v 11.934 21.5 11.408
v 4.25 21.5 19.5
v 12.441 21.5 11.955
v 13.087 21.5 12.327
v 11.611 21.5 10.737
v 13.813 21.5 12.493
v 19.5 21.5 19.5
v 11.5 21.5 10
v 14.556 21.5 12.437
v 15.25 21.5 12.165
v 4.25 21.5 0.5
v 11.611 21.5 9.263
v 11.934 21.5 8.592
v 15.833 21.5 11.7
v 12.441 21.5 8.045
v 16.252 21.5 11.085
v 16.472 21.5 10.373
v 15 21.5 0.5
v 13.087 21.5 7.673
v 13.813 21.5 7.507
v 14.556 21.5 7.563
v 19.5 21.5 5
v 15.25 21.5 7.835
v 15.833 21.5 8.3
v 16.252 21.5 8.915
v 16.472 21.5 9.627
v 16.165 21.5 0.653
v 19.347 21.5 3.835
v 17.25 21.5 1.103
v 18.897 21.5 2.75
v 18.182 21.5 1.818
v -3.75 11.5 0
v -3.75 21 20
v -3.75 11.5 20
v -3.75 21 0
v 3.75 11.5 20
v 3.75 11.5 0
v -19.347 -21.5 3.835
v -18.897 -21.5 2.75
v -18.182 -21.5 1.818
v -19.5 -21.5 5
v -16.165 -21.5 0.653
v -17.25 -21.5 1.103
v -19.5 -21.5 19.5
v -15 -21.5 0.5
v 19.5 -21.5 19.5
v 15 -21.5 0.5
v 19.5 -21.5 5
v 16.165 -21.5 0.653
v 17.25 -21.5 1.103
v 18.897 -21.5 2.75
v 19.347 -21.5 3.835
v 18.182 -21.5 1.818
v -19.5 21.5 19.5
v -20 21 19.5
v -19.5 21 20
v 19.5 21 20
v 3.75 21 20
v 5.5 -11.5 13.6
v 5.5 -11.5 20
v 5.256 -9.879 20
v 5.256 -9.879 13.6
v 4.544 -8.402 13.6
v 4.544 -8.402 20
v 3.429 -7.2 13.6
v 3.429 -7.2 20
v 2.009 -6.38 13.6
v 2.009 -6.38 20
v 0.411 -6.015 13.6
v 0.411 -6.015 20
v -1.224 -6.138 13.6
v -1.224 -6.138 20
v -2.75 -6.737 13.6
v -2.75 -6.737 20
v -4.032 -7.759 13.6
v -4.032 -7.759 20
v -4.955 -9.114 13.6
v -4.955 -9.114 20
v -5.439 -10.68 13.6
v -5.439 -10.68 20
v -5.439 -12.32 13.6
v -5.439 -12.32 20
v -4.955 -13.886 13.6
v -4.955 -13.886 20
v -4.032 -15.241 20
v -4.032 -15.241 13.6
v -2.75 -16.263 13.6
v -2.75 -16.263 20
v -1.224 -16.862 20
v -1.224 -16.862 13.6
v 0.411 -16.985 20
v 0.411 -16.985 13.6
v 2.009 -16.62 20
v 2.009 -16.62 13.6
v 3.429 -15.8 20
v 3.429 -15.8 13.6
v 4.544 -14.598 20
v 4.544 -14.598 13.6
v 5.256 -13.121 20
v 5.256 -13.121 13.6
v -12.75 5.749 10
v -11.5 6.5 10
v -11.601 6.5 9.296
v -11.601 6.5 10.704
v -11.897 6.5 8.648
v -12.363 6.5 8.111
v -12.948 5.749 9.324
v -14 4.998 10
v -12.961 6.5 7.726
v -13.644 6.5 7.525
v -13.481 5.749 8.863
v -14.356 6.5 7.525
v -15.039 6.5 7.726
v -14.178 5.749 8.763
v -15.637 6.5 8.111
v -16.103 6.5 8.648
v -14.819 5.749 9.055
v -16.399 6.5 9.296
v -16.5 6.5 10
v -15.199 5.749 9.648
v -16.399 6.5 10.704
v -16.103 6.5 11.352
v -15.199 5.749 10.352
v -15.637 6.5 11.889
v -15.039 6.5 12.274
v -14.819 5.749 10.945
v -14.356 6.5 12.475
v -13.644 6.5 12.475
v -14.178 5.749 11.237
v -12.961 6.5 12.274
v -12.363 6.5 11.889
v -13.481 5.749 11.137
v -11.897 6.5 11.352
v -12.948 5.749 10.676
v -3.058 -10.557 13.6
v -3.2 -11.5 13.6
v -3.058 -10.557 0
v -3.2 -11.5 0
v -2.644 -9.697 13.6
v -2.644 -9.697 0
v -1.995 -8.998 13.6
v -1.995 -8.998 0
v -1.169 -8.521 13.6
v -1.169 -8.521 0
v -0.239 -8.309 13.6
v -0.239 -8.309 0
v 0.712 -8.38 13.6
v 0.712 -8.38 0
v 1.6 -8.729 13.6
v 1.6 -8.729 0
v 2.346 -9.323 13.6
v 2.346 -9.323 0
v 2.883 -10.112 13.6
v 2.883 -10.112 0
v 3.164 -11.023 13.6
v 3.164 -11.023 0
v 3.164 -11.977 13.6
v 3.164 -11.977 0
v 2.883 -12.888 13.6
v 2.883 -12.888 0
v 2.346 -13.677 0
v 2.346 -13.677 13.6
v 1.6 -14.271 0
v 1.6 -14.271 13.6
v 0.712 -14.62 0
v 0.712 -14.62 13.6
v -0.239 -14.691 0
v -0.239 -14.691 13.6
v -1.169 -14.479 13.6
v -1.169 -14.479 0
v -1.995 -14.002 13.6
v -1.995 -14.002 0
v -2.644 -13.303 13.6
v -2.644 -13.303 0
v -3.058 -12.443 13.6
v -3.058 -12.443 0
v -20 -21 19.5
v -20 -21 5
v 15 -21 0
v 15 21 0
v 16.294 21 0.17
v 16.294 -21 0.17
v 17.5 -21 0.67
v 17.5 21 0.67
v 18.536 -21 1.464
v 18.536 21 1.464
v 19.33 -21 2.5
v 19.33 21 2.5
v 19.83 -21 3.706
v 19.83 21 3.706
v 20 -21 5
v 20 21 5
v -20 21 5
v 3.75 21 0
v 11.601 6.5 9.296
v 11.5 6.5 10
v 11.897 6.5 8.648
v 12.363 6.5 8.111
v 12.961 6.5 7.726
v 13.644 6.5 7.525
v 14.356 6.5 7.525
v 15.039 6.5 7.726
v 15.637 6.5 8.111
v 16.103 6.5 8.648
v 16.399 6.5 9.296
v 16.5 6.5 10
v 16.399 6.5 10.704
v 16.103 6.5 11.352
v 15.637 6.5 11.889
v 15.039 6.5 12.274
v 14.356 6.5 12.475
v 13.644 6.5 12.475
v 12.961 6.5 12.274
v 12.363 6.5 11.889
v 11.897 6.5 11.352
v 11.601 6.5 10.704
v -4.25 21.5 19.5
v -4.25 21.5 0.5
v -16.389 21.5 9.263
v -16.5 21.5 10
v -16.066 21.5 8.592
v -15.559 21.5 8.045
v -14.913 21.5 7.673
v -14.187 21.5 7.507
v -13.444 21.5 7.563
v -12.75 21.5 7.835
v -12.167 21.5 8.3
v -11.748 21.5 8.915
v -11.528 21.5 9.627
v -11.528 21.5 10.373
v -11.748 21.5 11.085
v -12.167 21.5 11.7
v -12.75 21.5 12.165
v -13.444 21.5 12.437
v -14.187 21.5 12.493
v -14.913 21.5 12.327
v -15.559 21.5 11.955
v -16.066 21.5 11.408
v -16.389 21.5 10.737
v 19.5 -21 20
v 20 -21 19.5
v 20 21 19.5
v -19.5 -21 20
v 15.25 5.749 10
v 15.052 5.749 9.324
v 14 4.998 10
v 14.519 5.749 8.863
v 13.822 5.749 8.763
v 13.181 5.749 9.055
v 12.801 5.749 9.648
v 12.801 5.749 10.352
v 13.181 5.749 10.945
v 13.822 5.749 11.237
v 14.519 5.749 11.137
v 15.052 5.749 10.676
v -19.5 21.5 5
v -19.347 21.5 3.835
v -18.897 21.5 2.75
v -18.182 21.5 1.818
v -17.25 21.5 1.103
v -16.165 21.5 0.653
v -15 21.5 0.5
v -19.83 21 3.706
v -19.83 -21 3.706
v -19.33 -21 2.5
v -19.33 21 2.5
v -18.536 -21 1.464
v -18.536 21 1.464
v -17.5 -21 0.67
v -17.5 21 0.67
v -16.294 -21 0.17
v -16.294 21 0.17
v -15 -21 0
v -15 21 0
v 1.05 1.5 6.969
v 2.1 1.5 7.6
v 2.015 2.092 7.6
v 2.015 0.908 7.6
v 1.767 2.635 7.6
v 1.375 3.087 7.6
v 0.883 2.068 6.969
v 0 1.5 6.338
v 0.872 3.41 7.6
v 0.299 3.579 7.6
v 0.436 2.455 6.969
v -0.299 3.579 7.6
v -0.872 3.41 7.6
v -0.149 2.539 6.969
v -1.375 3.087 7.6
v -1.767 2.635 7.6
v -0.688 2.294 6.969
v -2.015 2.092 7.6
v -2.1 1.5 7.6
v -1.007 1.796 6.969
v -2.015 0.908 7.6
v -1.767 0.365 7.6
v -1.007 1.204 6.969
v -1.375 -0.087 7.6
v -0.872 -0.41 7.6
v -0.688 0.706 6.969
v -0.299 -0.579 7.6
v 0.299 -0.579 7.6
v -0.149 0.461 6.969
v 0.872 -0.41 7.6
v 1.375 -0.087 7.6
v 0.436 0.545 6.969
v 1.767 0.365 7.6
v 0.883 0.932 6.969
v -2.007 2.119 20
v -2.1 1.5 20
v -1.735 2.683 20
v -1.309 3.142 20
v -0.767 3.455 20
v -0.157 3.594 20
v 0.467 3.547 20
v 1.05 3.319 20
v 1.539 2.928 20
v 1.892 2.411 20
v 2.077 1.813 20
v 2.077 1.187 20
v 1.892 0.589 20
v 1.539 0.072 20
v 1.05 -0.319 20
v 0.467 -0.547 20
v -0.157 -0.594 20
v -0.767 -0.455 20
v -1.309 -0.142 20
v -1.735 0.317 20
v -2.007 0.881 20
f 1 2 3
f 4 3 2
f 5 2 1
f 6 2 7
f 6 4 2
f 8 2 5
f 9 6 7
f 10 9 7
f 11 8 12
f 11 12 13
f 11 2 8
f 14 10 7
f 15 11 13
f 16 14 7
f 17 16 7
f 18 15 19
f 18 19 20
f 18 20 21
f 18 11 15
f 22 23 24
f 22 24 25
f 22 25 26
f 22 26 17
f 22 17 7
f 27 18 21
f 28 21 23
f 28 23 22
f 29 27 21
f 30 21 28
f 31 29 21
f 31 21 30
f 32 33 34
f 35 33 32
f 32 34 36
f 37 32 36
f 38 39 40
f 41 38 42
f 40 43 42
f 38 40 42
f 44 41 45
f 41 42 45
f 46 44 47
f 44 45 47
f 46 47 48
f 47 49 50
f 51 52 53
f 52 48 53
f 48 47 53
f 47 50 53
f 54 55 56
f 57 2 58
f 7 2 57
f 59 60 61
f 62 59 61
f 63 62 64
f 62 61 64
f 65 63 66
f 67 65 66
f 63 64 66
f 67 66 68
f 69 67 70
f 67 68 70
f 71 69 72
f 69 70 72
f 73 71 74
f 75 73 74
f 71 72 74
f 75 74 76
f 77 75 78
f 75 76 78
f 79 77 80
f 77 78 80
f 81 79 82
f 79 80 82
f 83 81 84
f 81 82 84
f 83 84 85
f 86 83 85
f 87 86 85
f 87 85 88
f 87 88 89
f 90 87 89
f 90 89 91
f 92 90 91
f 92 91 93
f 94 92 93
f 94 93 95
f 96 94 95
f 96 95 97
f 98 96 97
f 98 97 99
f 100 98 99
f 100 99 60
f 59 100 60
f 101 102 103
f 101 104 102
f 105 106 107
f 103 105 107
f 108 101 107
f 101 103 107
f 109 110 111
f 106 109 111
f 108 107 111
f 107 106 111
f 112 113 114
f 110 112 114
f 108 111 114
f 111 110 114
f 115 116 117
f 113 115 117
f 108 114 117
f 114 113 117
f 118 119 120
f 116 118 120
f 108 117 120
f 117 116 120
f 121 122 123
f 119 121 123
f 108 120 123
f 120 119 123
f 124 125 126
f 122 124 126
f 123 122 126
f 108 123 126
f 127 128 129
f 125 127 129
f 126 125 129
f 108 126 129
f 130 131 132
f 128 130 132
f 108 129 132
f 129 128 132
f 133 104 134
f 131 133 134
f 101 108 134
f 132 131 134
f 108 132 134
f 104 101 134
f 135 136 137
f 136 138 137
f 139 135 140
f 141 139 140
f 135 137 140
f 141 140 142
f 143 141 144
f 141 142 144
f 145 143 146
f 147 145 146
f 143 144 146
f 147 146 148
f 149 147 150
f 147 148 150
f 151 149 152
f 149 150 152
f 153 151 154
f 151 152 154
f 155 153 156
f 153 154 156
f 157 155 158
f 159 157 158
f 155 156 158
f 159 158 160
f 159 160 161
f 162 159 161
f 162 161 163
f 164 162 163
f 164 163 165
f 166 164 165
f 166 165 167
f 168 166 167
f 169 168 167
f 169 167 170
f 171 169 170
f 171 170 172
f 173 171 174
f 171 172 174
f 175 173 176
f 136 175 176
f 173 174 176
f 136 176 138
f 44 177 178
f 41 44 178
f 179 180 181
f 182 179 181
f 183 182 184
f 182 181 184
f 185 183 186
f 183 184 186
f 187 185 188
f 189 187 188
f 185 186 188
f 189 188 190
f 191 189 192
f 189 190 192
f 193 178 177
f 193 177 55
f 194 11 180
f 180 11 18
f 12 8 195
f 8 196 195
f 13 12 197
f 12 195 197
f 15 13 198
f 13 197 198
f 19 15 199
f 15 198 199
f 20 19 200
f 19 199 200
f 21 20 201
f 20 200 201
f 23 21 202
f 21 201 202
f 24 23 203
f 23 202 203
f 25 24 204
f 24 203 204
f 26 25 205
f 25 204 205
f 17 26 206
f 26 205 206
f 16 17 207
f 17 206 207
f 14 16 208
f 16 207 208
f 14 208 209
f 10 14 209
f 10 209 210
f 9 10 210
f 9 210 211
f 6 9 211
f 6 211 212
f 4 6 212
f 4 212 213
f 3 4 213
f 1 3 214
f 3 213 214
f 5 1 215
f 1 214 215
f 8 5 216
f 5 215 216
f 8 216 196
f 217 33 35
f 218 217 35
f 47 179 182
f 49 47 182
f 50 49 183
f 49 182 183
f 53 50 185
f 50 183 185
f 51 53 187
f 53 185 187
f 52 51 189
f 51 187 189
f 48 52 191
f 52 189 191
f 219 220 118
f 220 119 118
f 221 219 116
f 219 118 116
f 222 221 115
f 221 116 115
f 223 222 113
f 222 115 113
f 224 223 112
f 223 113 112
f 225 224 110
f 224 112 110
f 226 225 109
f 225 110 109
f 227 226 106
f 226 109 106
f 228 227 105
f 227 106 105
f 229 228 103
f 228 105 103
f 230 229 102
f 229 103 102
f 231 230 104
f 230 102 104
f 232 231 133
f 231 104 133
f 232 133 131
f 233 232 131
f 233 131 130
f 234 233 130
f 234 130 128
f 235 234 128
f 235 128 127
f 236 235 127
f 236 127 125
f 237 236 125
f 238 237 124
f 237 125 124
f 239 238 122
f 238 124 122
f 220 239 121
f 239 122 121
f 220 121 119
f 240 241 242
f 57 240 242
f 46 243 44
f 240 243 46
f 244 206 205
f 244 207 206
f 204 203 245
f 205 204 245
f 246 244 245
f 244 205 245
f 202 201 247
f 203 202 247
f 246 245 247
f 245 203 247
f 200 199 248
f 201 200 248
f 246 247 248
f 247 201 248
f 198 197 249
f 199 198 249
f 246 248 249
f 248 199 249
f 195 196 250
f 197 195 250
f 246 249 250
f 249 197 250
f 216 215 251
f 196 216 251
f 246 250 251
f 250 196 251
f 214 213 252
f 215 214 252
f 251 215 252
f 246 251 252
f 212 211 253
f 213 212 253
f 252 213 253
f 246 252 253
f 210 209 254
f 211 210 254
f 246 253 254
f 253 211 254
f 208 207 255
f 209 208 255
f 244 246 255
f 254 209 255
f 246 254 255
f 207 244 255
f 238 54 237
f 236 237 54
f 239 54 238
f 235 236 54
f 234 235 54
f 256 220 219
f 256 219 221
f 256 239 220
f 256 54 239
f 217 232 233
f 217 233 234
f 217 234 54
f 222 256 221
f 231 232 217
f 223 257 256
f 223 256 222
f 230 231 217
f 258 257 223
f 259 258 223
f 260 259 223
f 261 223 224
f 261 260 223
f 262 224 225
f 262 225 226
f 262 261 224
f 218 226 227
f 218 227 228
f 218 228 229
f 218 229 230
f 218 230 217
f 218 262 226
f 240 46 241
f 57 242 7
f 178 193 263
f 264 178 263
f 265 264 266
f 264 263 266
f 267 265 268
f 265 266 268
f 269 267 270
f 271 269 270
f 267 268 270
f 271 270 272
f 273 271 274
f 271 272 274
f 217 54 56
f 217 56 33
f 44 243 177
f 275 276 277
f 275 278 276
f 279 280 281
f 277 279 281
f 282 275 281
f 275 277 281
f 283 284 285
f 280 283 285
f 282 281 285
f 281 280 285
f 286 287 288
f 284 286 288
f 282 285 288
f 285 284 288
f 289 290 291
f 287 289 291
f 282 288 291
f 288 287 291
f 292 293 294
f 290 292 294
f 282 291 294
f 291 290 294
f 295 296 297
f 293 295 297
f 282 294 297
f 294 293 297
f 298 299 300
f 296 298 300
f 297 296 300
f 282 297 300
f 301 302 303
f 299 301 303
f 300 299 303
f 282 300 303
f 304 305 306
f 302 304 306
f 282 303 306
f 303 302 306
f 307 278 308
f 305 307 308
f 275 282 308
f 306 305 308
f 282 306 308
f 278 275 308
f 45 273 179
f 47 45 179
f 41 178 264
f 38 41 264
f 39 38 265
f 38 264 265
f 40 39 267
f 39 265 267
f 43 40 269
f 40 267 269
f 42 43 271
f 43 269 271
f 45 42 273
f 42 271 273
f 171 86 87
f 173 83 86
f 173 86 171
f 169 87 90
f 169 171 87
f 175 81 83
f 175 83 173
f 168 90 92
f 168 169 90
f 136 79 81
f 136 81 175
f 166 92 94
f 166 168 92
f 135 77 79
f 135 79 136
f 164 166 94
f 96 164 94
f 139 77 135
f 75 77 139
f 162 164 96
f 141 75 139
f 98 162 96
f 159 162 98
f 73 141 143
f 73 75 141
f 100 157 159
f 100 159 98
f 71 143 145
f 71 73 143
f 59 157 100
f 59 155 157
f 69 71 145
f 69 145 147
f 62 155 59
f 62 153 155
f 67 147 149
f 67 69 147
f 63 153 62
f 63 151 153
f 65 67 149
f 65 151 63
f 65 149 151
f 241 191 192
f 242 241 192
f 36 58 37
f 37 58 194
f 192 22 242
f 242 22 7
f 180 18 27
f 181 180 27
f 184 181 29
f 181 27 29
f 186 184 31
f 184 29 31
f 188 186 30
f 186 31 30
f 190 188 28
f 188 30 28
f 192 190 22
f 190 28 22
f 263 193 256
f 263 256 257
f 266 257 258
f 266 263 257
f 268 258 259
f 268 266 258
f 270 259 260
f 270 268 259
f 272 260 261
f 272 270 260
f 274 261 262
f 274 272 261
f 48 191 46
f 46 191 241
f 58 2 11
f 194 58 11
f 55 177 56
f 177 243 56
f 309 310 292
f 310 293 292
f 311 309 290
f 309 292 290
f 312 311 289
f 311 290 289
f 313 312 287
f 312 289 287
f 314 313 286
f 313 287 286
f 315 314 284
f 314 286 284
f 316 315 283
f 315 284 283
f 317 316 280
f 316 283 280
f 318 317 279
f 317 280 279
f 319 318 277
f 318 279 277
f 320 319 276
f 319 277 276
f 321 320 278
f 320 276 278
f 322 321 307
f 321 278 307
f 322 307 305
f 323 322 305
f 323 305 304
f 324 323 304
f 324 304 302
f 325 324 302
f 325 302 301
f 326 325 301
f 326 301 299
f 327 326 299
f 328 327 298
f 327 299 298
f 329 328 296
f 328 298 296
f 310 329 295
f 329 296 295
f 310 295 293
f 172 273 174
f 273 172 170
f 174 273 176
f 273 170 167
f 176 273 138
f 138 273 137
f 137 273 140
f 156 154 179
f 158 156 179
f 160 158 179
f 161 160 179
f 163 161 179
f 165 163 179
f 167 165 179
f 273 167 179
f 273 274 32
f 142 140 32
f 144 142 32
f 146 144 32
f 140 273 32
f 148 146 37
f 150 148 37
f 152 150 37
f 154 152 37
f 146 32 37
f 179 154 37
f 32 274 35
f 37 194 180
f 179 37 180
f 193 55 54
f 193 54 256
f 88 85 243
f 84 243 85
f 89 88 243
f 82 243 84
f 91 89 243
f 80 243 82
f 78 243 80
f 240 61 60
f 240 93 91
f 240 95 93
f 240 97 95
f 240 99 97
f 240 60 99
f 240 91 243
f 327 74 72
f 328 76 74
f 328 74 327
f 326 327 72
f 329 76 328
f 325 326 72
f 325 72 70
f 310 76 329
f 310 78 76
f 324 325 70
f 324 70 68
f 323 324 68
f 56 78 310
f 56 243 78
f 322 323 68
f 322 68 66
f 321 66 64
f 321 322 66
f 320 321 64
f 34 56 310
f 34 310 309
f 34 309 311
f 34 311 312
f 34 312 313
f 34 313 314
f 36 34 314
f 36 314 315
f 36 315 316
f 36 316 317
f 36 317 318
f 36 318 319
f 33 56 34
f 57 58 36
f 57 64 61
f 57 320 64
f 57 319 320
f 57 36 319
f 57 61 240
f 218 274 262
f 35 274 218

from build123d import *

# Parameters (mm, degrees)
SKETCH1_W                                           = 40
SKETCH1_H                                           = 43
BOSS_EXTRUDE1_DEPTH                                 = 20
SKETCH2_W                                           = 7.5
SKETCH2_H                                           = 20
CUT_EXTRUDE1_DEPTH                                  = 10
M6_TAPPED_HOLE1_D                                   = 5
M6_TAPPED_HOLE1_DEPTH                               = 15
M6_TAPPED_HOLE1_TIP                                 = 1.502151548
FILLET1_R                                           = 5
CHAMFER1_SIZE                                       = 0.5
CBORE_FOR_M6_HEX_SOCKET_HEAD_CAP_SCREW1_D           = 6.4
CBORE_FOR_M6_HEX_SOCKET_HEAD_CAP_SCREW1_CBORE_D     = 11
CBORE_FOR_M6_HEX_SOCKET_HEAD_CAP_SCREW1_CBORE_DEPTH = 6.4
M5_TAPPED_HOLE1_D                                   = 4.2
M5_TAPPED_HOLE1_DEPTH                               = 12.4
M5_TAPPED_HOLE1_TIP                                 = 1.2618073


with BuildPart() as part:
    # Sketch1 → Boss-Extrude1 (new body)
    with BuildSketch(Plane.XY):
        Rectangle(SKETCH1_W, SKETCH1_H)
    extrude(amount=BOSS_EXTRUDE1_DEPTH)

    # Sketch2 → Cut-Extrude1 (cut)
    with BuildSketch(Plane(origin=(0, 21.5, 0), x_dir=(1, 0, 0), z_dir=(0, 1, 0))):
        with Locations((0, -10)):
            Rectangle(SKETCH2_W, SKETCH2_H)
    extrude(amount=-CUT_EXTRUDE1_DEPTH, mode=Mode.SUBTRACT)

    # M6 Tapped Hole1
    with Locations(Plane(origin=(0, 21.5, 0), x_dir=(1, 0, 0), z_dir=(0, 1, 0))):
        with Locations((-14, -10), (14, -10)):
            Hole(M6_TAPPED_HOLE1_D / 2, depth=M6_TAPPED_HOLE1_DEPTH)
            with Locations((0, 0, -(M6_TAPPED_HOLE1_DEPTH + M6_TAPPED_HOLE1_TIP / 2))):  # 118° drill point
                Cone(0, M6_TAPPED_HOLE1_D / 2, M6_TAPPED_HOLE1_TIP, mode=Mode.SUBTRACT)

    # Fillet1
    fillet1_edges = [part.edges().sort_by_distance(p)[0] for p in [
        (-20, 0, 0),
        (20, 0, 0),
    ]]
    fillet(fillet1_edges, radius=FILLET1_R)

    # Chamfer1
    chamfer1_edges = [part.edges().sort_by_distance(p)[0] for p in [
        (-20, 0, 20),
        (-9.375, 21.5, 0),
        (0, -21.5, 20),
        (-11.875, 21.5, 20),
        (-3.75, 21.5, 10),
        (3.75, 21.5, 10),
        (0, -21.5, 0),
        (18.535533906, -21.5, 1.464466094),
        (-18.535533906, -21.5, 1.464466094),
        (9.375, 21.5, 0),
        (-18.535533906, 21.5, 1.464466094),
        (20, 0, 20),
        (18.535533906, 21.5, 1.464466094),
        (20, -21.5, 12.5),
        (-20, -21.5, 12.5),
        (-20, 21.5, 12.5),
        (20, 21.5, 12.5),
        (11.875, 21.5, 20),
    ]]
    chamfer(chamfer1_edges, length=CHAMFER1_SIZE)

    # CBORE for M6 Hex Socket Head Cap Screw1 (through all)
    with Locations(Plane.XY.offset(20)):
        with Locations((0, -11.5)):
            CounterBoreHole(CBORE_FOR_M6_HEX_SOCKET_HEAD_CAP_SCREW1_D / 2, CBORE_FOR_M6_HEX_SOCKET_HEAD_CAP_SCREW1_CBORE_D / 2, CBORE_FOR_M6_HEX_SOCKET_HEAD_CAP_SCREW1_CBORE_DEPTH)

    # M5 Tapped Hole1
    with Locations(Plane.XY.offset(20)):
        with Locations((0, 1.5)):
            Hole(M5_TAPPED_HOLE1_D / 2, depth=M5_TAPPED_HOLE1_DEPTH)
            with Locations((0, 0, -(M5_TAPPED_HOLE1_DEPTH + M5_TAPPED_HOLE1_TIP / 2))):  # 118° drill point
                Cone(0, M5_TAPPED_HOLE1_D / 2, M5_TAPPED_HOLE1_TIP, mode=Mode.SUBTRACT)


solid = part.part
